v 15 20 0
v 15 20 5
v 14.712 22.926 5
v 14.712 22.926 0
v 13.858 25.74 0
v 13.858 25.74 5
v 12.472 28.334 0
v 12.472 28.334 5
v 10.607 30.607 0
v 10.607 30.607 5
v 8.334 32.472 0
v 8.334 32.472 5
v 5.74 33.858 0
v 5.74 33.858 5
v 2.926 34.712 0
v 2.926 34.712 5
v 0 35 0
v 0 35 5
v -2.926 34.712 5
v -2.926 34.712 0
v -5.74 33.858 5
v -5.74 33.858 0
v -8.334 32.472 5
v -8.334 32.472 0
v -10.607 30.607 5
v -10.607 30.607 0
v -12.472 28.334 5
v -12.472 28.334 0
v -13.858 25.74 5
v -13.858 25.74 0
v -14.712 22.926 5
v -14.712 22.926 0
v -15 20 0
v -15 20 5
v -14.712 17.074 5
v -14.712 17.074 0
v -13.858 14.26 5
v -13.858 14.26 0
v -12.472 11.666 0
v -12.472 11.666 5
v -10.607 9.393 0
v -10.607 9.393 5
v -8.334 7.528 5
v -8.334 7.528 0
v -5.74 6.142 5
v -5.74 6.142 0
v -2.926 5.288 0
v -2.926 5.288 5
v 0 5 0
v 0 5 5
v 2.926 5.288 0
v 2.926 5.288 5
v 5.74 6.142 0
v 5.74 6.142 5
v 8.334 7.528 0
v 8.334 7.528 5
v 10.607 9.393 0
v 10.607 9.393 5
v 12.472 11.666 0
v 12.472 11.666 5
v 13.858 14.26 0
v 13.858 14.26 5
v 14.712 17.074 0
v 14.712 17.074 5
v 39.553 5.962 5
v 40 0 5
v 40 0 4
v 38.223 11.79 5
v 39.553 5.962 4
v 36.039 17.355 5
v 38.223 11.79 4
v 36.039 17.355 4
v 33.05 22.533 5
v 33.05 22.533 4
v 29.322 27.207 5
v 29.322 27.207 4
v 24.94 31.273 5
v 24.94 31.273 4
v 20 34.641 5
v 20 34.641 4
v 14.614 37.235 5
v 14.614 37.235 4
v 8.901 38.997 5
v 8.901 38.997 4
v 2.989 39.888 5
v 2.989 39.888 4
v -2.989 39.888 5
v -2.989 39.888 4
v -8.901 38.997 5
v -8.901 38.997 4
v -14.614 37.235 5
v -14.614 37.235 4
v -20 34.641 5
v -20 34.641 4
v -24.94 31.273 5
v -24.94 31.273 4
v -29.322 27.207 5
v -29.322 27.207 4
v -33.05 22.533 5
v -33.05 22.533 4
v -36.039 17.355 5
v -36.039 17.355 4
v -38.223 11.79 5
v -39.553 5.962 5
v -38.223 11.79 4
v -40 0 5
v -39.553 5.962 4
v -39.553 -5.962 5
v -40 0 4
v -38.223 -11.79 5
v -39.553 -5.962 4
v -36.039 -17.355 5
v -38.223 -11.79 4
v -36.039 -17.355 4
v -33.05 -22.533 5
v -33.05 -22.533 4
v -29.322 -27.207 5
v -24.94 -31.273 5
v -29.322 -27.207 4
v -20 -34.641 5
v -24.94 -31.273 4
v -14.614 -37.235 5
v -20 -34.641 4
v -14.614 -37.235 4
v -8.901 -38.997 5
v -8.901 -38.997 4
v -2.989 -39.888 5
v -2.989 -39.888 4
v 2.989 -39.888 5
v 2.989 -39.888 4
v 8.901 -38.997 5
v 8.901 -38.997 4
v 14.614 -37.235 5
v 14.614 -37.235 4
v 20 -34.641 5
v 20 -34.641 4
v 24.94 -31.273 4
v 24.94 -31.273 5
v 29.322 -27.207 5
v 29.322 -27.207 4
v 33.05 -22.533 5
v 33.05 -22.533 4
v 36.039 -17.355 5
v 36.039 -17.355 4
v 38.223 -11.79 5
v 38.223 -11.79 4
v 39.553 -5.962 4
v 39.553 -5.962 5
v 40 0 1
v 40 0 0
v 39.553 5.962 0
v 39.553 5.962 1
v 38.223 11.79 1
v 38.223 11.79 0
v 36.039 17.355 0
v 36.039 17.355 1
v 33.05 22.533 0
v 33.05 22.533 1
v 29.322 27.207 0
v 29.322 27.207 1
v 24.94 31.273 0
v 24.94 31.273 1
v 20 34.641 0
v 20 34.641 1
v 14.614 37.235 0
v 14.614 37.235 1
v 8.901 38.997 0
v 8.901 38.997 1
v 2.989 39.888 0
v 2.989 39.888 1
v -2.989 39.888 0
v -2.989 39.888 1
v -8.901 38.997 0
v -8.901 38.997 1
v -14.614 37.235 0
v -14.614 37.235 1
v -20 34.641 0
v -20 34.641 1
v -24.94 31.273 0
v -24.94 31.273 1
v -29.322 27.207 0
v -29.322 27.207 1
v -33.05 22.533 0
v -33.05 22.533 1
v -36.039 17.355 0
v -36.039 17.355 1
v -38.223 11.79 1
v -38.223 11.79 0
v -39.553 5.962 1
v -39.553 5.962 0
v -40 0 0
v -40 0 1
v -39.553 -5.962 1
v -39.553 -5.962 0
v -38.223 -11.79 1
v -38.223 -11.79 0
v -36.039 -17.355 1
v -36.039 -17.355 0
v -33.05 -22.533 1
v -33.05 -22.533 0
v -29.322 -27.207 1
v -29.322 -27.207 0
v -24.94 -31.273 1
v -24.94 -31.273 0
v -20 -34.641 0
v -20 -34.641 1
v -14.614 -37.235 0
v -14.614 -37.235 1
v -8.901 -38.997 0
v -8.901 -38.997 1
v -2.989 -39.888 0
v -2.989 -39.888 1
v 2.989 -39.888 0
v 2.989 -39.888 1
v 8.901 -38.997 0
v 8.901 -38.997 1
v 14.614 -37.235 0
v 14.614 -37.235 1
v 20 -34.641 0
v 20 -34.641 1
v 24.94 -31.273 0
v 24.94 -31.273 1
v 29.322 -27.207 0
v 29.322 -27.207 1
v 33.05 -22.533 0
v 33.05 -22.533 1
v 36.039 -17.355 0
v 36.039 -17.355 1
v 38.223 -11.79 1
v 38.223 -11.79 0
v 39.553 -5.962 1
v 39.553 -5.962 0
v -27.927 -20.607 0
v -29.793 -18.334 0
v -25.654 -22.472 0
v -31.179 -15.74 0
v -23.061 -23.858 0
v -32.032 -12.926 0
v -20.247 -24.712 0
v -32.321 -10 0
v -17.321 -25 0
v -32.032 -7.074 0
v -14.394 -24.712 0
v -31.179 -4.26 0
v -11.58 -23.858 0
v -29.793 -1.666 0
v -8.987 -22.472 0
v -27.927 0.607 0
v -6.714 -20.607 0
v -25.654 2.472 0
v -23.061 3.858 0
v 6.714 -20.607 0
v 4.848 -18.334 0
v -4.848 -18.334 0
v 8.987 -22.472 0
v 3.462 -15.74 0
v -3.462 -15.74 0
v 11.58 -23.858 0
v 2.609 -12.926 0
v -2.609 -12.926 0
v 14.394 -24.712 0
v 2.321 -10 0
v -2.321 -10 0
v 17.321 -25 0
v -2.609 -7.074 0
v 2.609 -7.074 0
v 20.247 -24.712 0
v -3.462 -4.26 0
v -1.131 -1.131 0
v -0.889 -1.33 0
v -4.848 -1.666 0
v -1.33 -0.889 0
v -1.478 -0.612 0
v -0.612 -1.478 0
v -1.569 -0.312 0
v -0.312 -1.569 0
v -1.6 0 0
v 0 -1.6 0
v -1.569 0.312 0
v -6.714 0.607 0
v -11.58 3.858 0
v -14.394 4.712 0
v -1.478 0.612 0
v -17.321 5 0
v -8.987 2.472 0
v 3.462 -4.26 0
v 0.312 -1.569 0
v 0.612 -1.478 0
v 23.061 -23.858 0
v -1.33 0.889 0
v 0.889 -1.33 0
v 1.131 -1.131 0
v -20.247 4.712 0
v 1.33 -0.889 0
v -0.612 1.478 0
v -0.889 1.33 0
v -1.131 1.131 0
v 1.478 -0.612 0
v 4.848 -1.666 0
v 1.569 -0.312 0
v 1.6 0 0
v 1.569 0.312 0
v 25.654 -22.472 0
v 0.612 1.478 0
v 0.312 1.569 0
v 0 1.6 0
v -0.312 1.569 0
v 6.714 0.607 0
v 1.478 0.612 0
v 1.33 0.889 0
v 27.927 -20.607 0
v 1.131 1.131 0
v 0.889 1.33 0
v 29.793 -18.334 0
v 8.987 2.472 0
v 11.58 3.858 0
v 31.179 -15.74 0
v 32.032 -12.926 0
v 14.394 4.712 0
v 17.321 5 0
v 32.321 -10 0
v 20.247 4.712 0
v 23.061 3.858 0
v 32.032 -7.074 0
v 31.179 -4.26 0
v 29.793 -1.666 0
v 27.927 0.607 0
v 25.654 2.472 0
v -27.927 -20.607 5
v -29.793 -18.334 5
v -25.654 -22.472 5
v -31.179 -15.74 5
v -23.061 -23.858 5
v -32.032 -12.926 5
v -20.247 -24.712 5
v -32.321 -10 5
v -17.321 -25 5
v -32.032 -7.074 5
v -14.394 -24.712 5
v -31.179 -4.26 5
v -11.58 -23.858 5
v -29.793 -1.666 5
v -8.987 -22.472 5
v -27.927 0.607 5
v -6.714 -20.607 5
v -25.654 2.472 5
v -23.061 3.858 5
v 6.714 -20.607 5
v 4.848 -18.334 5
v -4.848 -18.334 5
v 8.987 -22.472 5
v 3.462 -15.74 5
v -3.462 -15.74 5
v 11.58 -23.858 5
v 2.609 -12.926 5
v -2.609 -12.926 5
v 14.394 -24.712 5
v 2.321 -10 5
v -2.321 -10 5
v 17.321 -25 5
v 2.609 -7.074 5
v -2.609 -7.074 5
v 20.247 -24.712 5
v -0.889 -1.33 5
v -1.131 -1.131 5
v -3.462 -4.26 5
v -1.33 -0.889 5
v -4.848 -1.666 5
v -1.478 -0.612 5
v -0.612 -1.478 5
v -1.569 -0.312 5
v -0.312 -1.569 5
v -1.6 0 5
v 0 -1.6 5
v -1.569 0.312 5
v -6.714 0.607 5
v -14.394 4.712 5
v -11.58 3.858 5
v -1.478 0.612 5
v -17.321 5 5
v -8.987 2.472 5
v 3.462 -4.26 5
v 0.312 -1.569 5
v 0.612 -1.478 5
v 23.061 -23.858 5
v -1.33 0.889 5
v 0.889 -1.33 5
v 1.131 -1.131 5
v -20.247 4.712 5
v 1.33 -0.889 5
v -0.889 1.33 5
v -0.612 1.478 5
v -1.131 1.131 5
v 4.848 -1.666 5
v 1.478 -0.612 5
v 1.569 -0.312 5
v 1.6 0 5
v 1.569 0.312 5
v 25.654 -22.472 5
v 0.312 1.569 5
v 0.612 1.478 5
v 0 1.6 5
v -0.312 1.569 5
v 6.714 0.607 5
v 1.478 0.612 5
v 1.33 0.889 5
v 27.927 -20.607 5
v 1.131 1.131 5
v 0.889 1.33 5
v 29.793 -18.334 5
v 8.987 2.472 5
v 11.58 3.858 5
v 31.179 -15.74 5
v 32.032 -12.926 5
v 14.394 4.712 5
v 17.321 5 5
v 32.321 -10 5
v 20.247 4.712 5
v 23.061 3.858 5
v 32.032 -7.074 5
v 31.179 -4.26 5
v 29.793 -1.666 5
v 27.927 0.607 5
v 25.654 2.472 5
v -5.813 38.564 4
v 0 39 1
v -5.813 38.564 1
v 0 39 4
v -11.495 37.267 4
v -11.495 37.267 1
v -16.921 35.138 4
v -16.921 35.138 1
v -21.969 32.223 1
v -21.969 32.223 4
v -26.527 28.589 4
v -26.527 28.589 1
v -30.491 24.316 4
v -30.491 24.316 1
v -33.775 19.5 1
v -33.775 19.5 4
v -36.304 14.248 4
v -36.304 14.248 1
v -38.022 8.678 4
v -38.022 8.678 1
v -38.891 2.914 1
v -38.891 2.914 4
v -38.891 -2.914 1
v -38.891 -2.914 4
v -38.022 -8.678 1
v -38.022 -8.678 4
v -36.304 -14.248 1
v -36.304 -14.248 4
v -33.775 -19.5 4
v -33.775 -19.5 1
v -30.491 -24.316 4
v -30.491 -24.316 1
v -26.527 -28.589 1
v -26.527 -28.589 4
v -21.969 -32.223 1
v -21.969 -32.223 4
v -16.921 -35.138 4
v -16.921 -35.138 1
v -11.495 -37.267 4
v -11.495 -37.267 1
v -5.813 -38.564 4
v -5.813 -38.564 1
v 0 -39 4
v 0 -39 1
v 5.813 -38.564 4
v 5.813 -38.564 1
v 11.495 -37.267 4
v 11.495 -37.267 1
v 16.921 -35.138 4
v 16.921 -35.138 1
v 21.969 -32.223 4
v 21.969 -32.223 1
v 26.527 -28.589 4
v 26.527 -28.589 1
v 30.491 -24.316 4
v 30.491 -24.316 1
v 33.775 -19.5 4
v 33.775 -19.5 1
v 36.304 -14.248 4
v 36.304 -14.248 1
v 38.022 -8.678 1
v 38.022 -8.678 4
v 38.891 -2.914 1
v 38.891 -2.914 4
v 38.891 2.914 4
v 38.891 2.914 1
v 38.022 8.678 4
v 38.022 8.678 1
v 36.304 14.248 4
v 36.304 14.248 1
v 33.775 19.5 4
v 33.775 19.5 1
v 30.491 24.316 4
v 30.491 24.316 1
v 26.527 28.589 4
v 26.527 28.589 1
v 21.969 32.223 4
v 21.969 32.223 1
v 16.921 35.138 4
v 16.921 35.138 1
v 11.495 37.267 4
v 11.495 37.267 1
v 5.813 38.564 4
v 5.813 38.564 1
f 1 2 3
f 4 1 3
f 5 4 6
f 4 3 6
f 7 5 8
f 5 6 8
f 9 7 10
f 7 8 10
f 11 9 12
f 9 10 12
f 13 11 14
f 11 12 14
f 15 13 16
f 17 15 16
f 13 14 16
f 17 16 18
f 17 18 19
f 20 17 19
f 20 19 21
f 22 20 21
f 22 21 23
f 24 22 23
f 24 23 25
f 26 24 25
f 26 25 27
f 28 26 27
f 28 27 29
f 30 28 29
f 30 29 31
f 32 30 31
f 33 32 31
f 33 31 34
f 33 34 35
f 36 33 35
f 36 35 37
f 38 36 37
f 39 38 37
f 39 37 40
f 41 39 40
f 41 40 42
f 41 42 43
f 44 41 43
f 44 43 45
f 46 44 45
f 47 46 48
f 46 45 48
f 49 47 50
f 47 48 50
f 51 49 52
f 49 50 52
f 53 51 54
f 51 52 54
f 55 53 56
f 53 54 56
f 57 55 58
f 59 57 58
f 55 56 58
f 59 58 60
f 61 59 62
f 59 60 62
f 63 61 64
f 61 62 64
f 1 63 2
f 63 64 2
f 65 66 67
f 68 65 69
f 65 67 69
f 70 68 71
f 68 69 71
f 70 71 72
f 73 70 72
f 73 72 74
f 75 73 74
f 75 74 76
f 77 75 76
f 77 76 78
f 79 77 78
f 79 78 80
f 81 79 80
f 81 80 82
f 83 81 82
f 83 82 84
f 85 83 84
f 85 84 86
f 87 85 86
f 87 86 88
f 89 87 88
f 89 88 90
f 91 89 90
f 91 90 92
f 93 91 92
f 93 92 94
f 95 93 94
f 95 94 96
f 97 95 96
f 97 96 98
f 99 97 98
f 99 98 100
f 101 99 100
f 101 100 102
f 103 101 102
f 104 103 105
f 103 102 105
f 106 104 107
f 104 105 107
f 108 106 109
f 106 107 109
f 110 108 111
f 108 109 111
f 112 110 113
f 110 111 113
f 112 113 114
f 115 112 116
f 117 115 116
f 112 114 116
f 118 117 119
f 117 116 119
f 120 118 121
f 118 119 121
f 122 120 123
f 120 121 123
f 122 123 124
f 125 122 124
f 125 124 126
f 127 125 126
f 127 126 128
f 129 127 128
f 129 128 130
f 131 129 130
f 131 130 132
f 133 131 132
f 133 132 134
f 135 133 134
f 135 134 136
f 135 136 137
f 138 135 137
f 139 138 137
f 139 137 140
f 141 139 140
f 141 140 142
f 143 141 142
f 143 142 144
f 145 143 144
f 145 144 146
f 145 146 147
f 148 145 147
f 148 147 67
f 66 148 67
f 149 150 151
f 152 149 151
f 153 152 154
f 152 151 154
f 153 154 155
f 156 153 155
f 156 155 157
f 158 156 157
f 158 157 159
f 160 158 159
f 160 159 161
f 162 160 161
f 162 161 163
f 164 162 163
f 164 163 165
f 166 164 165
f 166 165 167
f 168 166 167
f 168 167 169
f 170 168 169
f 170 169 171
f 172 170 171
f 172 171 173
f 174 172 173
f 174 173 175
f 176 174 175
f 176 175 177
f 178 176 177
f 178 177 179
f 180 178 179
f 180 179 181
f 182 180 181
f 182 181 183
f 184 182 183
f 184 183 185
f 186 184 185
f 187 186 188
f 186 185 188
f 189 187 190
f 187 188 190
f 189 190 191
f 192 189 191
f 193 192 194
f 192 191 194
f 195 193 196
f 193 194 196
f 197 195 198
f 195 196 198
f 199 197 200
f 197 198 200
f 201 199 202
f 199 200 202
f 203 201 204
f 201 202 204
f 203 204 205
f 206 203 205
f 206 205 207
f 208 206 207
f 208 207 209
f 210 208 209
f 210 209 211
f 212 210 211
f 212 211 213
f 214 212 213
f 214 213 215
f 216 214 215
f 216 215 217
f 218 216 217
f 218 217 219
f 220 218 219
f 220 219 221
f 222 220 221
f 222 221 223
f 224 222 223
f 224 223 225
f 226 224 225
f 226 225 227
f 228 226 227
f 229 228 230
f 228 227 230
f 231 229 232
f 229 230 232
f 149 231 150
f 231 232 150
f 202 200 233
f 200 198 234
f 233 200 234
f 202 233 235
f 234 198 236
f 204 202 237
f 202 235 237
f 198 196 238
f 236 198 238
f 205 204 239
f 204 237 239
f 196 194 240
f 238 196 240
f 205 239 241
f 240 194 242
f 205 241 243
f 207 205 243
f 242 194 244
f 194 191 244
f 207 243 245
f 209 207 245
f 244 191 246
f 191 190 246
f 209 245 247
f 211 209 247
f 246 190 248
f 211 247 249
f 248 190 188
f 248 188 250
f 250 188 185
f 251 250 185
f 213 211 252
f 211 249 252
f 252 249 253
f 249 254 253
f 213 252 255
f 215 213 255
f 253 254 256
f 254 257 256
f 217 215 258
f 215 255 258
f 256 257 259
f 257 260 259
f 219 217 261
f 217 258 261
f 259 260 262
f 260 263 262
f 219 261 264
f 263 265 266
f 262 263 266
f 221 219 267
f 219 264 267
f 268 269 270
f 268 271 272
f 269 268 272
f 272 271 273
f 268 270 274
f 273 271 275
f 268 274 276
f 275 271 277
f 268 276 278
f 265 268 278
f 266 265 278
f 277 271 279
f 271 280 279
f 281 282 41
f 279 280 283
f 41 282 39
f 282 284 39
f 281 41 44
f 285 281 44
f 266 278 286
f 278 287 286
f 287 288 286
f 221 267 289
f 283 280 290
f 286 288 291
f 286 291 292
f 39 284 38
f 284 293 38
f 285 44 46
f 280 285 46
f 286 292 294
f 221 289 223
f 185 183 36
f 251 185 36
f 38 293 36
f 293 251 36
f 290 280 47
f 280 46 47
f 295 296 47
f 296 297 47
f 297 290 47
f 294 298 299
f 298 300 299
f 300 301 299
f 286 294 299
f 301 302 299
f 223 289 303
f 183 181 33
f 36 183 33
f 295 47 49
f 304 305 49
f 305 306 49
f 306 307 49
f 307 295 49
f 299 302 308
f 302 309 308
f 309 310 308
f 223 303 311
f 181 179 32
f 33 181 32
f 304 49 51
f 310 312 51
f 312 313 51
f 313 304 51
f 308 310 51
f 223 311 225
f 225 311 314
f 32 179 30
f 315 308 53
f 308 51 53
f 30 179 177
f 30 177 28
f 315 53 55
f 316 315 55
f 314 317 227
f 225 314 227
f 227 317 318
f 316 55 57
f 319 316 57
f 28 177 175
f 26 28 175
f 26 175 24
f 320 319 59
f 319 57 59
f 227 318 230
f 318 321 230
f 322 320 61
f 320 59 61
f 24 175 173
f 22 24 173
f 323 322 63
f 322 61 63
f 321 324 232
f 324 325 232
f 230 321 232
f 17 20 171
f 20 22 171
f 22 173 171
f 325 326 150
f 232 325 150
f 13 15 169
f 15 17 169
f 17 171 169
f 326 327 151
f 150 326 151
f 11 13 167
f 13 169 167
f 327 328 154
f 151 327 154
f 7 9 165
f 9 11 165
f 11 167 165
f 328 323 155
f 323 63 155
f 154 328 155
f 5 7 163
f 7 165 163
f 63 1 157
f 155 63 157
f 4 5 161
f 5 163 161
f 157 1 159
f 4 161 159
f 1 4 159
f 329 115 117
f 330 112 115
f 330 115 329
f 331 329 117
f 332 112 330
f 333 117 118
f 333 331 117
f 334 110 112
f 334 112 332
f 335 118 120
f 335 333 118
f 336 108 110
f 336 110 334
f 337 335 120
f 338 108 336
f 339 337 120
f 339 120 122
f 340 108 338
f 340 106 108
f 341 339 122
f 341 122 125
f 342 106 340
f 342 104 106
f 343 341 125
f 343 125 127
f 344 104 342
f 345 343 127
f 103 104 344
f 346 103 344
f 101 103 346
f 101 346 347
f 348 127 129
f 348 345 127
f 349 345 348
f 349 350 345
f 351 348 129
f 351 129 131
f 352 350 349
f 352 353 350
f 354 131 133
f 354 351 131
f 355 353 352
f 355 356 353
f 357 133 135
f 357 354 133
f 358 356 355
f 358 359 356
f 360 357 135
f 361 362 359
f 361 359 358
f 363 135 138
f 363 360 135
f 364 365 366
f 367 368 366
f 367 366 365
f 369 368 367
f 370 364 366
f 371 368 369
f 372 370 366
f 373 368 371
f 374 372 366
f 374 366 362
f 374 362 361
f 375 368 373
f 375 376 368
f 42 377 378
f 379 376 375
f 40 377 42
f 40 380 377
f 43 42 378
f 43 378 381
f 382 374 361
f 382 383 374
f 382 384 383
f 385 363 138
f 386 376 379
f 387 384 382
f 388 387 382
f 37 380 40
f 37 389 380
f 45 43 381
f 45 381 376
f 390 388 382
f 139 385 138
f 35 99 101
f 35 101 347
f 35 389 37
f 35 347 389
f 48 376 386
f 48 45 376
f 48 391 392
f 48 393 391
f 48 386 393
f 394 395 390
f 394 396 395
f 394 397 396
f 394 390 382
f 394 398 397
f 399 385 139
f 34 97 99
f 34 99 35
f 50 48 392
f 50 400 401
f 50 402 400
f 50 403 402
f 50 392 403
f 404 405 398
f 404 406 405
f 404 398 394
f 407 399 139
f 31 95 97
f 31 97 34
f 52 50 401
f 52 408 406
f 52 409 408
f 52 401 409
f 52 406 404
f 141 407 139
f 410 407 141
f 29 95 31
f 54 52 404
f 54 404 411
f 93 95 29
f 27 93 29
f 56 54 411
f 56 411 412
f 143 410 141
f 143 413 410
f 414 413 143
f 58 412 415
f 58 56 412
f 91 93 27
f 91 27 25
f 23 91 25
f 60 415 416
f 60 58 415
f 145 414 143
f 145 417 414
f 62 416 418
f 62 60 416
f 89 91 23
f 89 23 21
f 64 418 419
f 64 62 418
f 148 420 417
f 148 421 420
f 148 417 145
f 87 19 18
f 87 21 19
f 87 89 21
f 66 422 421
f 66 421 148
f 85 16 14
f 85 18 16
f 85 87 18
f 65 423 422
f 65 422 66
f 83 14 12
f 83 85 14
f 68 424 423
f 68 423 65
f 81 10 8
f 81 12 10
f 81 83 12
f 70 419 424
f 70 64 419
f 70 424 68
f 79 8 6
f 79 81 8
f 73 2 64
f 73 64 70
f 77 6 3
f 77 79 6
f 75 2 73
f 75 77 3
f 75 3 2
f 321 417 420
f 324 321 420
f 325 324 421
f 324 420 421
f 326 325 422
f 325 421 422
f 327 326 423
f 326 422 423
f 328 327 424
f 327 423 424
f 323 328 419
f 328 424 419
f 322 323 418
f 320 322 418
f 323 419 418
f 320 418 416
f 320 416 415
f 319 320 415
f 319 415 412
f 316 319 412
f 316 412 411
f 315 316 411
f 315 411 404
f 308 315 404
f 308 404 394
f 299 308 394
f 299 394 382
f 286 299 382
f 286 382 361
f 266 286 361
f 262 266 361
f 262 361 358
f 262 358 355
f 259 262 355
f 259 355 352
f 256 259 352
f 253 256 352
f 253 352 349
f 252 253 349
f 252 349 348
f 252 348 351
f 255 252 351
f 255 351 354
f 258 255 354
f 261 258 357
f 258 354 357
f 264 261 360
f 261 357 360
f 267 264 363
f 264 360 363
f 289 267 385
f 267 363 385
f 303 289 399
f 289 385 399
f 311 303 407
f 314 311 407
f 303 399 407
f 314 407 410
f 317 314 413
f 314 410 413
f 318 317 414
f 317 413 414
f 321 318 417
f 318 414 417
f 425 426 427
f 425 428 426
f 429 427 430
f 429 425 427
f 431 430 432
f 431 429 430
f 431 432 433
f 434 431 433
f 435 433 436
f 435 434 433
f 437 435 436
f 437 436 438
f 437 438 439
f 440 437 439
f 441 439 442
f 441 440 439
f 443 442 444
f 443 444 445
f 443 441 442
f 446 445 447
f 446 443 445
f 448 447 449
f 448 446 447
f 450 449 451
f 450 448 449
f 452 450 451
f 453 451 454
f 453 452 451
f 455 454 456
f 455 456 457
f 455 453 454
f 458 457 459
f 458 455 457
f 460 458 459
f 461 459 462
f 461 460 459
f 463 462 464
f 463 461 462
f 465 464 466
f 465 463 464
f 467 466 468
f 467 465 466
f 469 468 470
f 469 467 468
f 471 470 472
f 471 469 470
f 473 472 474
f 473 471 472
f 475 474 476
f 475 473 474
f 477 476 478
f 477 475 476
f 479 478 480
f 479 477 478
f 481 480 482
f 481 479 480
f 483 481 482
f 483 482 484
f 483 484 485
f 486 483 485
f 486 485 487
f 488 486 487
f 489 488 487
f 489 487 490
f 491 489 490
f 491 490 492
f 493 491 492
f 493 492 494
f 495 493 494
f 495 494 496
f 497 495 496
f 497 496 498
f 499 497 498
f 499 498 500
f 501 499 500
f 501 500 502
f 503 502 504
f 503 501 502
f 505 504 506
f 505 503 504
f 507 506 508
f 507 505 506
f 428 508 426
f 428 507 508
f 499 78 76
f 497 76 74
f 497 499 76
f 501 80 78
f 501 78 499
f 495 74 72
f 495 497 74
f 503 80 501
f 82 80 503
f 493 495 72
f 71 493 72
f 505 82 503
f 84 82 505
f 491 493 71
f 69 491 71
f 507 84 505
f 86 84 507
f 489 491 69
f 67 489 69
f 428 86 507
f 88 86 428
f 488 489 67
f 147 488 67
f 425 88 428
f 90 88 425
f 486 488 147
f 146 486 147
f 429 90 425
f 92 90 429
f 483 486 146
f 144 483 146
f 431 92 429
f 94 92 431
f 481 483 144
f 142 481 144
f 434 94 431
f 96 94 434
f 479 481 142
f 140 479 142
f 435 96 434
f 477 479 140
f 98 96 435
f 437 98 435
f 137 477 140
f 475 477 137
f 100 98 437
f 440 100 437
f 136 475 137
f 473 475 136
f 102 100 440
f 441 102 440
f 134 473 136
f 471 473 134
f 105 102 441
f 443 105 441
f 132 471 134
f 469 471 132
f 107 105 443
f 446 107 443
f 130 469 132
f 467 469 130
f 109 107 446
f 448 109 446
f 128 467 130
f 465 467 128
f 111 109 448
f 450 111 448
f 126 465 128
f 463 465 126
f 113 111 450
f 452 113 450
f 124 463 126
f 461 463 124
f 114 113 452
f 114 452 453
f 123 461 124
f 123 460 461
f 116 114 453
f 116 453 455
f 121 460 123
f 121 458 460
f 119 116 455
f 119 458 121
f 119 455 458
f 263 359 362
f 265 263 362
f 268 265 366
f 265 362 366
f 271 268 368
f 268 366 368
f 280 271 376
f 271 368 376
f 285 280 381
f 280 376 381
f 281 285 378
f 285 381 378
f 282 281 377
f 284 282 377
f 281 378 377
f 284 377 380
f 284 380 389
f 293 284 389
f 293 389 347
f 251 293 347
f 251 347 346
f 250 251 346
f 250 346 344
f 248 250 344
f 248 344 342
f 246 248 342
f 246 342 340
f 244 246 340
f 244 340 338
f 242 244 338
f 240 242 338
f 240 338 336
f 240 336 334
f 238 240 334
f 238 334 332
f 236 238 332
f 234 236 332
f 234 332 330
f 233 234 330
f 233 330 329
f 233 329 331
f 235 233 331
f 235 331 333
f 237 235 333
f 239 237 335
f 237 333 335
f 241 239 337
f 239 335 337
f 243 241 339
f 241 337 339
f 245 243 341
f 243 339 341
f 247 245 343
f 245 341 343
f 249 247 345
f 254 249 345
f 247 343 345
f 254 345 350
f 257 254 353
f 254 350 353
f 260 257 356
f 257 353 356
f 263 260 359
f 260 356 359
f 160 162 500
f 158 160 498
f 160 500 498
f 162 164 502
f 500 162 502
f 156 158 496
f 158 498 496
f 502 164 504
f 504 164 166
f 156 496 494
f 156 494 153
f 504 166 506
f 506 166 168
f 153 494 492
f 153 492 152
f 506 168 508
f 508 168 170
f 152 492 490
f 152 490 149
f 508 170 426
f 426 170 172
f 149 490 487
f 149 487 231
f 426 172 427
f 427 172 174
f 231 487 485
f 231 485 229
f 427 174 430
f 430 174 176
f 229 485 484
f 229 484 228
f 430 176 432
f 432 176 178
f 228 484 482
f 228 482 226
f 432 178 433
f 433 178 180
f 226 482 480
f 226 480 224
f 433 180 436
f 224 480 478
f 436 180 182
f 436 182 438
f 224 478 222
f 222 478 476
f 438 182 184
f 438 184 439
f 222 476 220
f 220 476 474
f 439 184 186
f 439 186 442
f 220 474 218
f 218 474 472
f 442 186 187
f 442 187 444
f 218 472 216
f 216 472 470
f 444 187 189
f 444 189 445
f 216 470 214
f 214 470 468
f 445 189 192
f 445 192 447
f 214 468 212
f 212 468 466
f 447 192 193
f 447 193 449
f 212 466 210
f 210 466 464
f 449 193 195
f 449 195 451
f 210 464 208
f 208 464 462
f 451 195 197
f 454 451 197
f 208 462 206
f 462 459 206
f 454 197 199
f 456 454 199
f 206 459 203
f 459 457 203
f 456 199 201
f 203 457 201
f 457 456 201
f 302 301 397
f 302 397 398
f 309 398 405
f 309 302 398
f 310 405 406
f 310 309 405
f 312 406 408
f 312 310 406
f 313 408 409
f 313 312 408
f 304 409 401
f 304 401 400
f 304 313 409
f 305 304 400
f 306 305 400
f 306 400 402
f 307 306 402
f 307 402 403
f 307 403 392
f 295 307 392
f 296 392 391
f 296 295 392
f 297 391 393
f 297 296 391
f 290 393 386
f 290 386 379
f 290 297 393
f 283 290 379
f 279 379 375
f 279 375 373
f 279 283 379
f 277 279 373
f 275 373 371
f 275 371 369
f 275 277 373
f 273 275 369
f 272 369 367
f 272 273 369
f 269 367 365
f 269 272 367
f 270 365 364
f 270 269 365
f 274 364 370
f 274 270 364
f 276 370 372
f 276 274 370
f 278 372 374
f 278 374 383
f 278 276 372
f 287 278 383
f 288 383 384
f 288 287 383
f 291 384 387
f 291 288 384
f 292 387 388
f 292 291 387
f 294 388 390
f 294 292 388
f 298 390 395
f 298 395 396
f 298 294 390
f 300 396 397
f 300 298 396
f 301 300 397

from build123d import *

# Parameters (mm, degrees)
F0_R     = 40
F0_R_2   = 1.6
F1_DEPTH = 5
F2_W     = 1
F2_H     = 3
F4_R     = 15
F5_DEPTH = 25


with BuildPart() as f1:
    # F0 (on Top) → F1 (new body)
    with BuildSketch(Plane.XY):
        Circle(F0_R)
        Circle(F0_R_2, mode=Mode.SUBTRACT)
    extrude(amount=F1_DEPTH)

    # F2 (on Right) → F3 (revolve, cut)
    with BuildSketch(Plane.YZ):
        with Locations((39.5, 2.5)):
            Rectangle(F2_W, F2_H)
    revolve(axis=Axis((0, 0, 5), (0, 0, 1)), mode=Mode.SUBTRACT)

    # F4 (on face) → F5 (cut)
    with BuildSketch(Plane.XY.offset(5)):
        with Locations((0, 20)):
            Circle(F4_R)
        with Locations((-17.320508, -10)):
            Circle(F4_R)
        with Locations((17.320508, -10)):
            Circle(F4_R)
    extrude(amount=-F5_DEPTH, mode=Mode.SUBTRACT)


solid = f1.part
